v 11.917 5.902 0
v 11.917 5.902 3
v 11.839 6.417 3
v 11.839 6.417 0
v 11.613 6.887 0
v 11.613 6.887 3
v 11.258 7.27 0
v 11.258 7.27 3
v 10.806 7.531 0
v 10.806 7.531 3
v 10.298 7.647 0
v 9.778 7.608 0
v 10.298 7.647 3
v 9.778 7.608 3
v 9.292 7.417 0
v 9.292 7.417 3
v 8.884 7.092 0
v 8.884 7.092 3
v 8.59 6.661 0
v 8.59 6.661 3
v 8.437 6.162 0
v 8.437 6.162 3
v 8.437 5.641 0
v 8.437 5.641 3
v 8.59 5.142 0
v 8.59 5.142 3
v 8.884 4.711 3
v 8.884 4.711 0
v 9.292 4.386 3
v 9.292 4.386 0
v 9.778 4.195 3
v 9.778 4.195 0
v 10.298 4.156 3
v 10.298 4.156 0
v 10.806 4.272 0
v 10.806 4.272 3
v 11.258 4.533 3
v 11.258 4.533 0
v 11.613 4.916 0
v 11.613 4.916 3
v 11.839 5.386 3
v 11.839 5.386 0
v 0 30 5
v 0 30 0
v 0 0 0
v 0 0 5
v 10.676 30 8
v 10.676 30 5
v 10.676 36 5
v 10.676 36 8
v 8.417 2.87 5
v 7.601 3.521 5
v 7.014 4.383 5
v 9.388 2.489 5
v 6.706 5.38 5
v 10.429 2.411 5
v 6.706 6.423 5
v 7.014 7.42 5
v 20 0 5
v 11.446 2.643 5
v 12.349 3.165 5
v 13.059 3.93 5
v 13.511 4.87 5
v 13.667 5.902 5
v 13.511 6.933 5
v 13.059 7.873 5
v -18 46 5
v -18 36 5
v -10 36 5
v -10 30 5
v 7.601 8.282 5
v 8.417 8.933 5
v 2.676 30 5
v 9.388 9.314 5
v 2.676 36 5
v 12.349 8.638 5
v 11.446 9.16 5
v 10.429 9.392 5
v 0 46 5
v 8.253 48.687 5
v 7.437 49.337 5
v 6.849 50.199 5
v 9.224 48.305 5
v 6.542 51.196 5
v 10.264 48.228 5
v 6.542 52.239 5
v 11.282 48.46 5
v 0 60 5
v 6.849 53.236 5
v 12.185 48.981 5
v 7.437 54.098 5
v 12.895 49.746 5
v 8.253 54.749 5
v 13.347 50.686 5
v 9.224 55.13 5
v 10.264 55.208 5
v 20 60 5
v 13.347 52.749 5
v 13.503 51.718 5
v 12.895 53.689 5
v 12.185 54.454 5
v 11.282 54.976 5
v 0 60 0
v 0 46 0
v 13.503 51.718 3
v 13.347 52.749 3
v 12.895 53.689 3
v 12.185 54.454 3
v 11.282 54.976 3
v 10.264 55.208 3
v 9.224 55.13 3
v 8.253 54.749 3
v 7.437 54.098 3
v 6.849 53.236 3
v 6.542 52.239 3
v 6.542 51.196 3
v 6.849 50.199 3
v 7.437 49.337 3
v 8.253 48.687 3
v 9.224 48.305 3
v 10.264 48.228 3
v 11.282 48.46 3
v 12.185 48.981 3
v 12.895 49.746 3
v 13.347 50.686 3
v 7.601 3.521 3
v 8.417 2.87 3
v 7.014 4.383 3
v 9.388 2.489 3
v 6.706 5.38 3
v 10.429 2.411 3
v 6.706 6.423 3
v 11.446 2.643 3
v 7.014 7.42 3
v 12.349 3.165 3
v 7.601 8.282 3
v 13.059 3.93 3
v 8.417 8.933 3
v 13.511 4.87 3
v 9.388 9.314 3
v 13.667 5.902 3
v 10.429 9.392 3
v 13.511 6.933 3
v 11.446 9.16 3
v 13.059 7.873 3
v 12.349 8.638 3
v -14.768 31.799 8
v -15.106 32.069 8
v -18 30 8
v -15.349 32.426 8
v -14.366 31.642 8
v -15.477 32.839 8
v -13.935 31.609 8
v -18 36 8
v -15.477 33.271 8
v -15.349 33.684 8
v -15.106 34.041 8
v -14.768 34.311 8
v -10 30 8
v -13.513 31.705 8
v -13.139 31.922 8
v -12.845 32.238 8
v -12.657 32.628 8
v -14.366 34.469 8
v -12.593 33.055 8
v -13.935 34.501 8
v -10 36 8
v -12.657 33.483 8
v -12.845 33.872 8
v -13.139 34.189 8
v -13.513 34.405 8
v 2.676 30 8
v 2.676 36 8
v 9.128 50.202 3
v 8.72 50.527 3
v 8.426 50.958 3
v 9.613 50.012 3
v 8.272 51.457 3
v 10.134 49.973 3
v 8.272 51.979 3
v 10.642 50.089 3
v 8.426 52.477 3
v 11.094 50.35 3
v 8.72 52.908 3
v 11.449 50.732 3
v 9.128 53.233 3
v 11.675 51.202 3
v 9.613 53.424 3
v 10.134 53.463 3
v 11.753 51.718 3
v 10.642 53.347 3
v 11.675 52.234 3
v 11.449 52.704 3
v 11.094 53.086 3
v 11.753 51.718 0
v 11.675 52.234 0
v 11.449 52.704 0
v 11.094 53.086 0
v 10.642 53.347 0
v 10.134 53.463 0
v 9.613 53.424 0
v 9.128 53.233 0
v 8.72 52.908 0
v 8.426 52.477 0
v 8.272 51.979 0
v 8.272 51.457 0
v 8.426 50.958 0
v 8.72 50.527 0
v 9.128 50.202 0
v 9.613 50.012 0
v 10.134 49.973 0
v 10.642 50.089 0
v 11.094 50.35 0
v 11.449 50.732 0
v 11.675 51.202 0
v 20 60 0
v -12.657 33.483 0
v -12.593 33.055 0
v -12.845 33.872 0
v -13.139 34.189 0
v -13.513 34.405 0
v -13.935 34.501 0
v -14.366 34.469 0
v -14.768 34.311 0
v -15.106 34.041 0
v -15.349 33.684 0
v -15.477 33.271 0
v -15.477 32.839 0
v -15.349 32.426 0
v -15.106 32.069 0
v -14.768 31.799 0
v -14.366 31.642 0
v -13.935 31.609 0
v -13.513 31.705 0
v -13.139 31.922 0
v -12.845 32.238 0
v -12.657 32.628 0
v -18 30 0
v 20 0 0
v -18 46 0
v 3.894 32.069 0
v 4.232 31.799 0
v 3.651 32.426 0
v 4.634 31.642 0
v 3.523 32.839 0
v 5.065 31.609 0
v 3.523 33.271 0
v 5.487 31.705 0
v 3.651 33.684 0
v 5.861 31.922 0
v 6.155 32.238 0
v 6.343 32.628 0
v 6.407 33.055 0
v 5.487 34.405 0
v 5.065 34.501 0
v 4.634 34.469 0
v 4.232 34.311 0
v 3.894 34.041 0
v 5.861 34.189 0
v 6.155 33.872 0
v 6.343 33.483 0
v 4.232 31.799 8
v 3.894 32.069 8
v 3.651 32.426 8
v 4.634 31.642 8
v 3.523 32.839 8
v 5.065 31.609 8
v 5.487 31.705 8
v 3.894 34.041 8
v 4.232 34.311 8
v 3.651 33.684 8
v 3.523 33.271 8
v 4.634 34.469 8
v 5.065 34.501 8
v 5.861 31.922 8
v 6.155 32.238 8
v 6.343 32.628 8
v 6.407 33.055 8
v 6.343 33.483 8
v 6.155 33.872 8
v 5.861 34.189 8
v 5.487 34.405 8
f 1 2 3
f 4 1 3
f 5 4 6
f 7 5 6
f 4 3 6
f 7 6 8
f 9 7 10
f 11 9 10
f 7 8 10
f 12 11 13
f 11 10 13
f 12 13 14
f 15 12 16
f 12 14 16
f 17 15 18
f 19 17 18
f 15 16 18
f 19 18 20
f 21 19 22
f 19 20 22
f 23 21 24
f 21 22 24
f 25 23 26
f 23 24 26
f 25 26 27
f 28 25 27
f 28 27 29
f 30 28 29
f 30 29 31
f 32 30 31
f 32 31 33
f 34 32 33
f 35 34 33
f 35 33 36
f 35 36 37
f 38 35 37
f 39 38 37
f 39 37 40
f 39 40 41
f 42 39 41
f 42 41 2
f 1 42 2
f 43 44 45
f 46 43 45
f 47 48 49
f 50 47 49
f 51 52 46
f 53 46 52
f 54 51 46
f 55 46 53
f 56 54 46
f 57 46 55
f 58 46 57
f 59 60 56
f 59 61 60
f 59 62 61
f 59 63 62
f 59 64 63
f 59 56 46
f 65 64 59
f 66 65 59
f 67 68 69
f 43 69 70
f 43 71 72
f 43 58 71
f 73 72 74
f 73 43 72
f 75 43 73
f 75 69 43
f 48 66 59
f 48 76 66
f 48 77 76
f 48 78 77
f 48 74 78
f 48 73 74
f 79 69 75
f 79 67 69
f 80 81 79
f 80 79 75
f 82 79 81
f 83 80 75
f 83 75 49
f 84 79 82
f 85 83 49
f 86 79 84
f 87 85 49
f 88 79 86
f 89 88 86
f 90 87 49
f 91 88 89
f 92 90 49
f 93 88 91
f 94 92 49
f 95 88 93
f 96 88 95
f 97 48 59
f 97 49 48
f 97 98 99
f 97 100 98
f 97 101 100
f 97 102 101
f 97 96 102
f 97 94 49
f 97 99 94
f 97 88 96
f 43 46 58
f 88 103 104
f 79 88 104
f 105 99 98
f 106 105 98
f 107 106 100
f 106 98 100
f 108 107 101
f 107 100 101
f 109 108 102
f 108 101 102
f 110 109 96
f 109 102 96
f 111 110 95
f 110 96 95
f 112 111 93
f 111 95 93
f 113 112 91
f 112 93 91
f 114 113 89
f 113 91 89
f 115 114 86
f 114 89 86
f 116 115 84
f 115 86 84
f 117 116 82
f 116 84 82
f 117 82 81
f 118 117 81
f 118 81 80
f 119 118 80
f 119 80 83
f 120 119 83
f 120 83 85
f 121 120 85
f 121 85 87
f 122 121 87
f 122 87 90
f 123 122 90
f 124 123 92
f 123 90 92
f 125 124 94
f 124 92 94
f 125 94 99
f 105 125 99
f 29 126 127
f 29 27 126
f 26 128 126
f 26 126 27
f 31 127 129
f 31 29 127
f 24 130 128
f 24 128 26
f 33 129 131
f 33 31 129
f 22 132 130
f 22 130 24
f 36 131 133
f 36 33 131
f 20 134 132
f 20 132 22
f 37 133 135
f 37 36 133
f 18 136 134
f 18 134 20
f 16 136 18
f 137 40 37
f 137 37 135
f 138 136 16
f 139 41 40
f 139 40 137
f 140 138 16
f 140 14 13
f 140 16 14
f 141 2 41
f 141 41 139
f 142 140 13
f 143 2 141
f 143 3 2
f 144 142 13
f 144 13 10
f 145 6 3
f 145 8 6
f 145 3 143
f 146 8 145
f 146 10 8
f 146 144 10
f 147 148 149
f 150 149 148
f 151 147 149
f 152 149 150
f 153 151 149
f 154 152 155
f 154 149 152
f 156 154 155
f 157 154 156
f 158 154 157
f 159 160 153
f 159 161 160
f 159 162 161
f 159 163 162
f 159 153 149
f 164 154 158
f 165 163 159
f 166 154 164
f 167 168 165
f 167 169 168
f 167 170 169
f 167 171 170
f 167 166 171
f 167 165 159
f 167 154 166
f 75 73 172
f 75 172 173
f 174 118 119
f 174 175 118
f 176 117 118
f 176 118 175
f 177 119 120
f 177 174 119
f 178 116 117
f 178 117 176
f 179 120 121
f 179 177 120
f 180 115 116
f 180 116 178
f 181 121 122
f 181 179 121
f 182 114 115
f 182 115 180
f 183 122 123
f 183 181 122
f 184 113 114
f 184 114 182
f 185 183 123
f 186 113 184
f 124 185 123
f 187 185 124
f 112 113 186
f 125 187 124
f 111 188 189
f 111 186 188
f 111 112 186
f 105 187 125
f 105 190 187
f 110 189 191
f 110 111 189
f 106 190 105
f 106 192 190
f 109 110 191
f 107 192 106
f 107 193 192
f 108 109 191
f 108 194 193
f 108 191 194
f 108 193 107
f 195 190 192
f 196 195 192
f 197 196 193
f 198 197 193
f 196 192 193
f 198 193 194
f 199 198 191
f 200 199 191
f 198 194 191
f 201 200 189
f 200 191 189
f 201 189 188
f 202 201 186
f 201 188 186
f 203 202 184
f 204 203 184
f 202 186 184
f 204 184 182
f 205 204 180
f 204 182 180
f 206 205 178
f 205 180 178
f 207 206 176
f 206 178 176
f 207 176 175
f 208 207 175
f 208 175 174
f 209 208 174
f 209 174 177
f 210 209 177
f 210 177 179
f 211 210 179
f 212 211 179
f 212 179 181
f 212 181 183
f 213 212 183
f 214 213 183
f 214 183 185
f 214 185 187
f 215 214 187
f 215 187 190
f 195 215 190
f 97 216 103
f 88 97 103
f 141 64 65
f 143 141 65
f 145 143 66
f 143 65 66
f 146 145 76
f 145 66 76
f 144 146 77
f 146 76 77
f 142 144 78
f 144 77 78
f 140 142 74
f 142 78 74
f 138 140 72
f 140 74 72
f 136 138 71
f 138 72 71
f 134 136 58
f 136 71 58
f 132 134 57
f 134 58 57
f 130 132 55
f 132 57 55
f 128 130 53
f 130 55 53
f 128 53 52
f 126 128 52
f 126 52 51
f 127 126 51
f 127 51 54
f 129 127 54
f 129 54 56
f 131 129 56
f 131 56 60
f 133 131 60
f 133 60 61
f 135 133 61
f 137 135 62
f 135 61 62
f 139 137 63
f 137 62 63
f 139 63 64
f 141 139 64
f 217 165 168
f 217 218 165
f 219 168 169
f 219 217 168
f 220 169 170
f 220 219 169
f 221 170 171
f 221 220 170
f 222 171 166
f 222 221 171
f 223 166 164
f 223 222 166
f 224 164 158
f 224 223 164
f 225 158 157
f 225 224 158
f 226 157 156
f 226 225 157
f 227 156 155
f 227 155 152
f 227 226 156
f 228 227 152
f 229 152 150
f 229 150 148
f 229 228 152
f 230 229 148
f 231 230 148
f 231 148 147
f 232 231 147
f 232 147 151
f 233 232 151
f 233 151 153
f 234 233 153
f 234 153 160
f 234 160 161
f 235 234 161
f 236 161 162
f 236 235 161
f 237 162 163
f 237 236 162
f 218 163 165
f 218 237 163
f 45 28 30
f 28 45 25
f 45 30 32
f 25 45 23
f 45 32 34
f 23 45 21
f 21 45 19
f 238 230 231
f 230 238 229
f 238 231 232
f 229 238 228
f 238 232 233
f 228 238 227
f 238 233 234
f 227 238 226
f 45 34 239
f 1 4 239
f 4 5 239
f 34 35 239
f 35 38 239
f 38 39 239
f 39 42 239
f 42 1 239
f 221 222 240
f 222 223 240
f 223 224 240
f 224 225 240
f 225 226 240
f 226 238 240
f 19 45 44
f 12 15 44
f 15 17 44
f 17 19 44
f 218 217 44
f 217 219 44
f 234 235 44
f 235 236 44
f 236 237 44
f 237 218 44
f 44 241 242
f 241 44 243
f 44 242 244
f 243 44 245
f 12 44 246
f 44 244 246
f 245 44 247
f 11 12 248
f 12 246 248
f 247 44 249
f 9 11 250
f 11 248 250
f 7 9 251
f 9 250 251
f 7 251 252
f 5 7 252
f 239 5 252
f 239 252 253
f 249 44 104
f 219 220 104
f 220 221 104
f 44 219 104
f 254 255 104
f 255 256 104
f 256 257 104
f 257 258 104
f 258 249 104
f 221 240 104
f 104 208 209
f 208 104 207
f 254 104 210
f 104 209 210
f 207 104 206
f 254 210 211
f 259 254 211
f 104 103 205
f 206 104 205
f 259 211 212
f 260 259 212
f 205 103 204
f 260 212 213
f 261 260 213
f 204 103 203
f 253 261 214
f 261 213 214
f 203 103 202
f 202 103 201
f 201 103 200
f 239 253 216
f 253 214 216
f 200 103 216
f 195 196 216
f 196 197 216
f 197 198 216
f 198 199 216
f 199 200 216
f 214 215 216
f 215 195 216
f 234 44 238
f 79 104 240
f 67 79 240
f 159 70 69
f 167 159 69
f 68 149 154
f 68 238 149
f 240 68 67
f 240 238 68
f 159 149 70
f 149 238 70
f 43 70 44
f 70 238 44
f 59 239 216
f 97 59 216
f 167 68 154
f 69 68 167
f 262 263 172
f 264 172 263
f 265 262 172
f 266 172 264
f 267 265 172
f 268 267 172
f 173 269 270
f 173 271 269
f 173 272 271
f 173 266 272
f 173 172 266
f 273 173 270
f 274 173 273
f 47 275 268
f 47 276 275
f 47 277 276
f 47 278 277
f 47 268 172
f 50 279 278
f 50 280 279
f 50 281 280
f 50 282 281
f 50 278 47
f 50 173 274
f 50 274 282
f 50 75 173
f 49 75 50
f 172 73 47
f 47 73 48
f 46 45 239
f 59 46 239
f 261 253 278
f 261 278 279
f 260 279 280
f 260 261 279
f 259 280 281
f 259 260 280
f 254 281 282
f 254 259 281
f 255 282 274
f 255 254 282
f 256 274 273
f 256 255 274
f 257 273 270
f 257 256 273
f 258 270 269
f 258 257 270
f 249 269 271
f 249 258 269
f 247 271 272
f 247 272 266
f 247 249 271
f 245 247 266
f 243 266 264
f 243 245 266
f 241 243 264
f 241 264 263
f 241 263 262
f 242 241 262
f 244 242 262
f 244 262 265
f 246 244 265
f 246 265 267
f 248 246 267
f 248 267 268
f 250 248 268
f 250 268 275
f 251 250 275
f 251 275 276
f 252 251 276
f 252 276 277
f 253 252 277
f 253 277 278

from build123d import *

# Parameters (mm, degrees)
F0_R     = 1.45
F1_DEPTH = 5
F2_R     = 1.75
F3_DEPTH = 25
F4_W     = 8
F4_H     = 6
F4_R     = 1.45
F5_DEPTH = 3
F6_R     = 3.5
F7_DEPTH = 2


with BuildPart() as f1:
    # F0 (on Top) → F1 (new body)
    with BuildSketch(Plane.XY):
        Polygon((0, 30), (0, 0), (20, 0), (20, 60), (0, 60), (0, 46), (-18, 46), (-18, 30), align=None)
        with Locations((-14.043072, 33.05522)):
            Circle(F0_R, mode=Mode.SUBTRACT)
        with Locations((4.956928, 33.05522)):
            Circle(F0_R, mode=Mode.SUBTRACT)
    extrude(amount=F1_DEPTH)

    # F2 (on face) → F3 (cut)
    with BuildSketch(Plane.XY.offset(5)):
        with Locations((10.002809, 51.71774)):
            Circle(F2_R)
        with Locations((10.166974, 5.901501)):
            Circle(F2_R)
    extrude(amount=-F3_DEPTH, mode=Mode.SUBTRACT)

    # F4 (on face) → F5 (join)
    with BuildSketch(Plane.XY.offset(5)):
        with Locations((-14, 33)):
            Rectangle(F4_W, F4_H)
        with Locations((-14.043072, 33.05522)):
            Circle(F4_R, mode=Mode.SUBTRACT)
        with Locations((6.67554, 33)):
            Rectangle(F4_W, F4_H)
        with Locations((4.956928, 33.05522)):
            Circle(F4_R, mode=Mode.SUBTRACT)
    extrude(amount=F5_DEPTH)

    # F6 (on face) → F7 (cut)
    with BuildSketch(Plane.XY.offset(5)):
        with Locations((10.002809, 51.71774)):
            Circle(F6_R)
        with Locations((10.166974, 5.901501)):
            Circle(F6_R)
    extrude(amount=-F7_DEPTH, mode=Mode.SUBTRACT)


solid = f1.part
